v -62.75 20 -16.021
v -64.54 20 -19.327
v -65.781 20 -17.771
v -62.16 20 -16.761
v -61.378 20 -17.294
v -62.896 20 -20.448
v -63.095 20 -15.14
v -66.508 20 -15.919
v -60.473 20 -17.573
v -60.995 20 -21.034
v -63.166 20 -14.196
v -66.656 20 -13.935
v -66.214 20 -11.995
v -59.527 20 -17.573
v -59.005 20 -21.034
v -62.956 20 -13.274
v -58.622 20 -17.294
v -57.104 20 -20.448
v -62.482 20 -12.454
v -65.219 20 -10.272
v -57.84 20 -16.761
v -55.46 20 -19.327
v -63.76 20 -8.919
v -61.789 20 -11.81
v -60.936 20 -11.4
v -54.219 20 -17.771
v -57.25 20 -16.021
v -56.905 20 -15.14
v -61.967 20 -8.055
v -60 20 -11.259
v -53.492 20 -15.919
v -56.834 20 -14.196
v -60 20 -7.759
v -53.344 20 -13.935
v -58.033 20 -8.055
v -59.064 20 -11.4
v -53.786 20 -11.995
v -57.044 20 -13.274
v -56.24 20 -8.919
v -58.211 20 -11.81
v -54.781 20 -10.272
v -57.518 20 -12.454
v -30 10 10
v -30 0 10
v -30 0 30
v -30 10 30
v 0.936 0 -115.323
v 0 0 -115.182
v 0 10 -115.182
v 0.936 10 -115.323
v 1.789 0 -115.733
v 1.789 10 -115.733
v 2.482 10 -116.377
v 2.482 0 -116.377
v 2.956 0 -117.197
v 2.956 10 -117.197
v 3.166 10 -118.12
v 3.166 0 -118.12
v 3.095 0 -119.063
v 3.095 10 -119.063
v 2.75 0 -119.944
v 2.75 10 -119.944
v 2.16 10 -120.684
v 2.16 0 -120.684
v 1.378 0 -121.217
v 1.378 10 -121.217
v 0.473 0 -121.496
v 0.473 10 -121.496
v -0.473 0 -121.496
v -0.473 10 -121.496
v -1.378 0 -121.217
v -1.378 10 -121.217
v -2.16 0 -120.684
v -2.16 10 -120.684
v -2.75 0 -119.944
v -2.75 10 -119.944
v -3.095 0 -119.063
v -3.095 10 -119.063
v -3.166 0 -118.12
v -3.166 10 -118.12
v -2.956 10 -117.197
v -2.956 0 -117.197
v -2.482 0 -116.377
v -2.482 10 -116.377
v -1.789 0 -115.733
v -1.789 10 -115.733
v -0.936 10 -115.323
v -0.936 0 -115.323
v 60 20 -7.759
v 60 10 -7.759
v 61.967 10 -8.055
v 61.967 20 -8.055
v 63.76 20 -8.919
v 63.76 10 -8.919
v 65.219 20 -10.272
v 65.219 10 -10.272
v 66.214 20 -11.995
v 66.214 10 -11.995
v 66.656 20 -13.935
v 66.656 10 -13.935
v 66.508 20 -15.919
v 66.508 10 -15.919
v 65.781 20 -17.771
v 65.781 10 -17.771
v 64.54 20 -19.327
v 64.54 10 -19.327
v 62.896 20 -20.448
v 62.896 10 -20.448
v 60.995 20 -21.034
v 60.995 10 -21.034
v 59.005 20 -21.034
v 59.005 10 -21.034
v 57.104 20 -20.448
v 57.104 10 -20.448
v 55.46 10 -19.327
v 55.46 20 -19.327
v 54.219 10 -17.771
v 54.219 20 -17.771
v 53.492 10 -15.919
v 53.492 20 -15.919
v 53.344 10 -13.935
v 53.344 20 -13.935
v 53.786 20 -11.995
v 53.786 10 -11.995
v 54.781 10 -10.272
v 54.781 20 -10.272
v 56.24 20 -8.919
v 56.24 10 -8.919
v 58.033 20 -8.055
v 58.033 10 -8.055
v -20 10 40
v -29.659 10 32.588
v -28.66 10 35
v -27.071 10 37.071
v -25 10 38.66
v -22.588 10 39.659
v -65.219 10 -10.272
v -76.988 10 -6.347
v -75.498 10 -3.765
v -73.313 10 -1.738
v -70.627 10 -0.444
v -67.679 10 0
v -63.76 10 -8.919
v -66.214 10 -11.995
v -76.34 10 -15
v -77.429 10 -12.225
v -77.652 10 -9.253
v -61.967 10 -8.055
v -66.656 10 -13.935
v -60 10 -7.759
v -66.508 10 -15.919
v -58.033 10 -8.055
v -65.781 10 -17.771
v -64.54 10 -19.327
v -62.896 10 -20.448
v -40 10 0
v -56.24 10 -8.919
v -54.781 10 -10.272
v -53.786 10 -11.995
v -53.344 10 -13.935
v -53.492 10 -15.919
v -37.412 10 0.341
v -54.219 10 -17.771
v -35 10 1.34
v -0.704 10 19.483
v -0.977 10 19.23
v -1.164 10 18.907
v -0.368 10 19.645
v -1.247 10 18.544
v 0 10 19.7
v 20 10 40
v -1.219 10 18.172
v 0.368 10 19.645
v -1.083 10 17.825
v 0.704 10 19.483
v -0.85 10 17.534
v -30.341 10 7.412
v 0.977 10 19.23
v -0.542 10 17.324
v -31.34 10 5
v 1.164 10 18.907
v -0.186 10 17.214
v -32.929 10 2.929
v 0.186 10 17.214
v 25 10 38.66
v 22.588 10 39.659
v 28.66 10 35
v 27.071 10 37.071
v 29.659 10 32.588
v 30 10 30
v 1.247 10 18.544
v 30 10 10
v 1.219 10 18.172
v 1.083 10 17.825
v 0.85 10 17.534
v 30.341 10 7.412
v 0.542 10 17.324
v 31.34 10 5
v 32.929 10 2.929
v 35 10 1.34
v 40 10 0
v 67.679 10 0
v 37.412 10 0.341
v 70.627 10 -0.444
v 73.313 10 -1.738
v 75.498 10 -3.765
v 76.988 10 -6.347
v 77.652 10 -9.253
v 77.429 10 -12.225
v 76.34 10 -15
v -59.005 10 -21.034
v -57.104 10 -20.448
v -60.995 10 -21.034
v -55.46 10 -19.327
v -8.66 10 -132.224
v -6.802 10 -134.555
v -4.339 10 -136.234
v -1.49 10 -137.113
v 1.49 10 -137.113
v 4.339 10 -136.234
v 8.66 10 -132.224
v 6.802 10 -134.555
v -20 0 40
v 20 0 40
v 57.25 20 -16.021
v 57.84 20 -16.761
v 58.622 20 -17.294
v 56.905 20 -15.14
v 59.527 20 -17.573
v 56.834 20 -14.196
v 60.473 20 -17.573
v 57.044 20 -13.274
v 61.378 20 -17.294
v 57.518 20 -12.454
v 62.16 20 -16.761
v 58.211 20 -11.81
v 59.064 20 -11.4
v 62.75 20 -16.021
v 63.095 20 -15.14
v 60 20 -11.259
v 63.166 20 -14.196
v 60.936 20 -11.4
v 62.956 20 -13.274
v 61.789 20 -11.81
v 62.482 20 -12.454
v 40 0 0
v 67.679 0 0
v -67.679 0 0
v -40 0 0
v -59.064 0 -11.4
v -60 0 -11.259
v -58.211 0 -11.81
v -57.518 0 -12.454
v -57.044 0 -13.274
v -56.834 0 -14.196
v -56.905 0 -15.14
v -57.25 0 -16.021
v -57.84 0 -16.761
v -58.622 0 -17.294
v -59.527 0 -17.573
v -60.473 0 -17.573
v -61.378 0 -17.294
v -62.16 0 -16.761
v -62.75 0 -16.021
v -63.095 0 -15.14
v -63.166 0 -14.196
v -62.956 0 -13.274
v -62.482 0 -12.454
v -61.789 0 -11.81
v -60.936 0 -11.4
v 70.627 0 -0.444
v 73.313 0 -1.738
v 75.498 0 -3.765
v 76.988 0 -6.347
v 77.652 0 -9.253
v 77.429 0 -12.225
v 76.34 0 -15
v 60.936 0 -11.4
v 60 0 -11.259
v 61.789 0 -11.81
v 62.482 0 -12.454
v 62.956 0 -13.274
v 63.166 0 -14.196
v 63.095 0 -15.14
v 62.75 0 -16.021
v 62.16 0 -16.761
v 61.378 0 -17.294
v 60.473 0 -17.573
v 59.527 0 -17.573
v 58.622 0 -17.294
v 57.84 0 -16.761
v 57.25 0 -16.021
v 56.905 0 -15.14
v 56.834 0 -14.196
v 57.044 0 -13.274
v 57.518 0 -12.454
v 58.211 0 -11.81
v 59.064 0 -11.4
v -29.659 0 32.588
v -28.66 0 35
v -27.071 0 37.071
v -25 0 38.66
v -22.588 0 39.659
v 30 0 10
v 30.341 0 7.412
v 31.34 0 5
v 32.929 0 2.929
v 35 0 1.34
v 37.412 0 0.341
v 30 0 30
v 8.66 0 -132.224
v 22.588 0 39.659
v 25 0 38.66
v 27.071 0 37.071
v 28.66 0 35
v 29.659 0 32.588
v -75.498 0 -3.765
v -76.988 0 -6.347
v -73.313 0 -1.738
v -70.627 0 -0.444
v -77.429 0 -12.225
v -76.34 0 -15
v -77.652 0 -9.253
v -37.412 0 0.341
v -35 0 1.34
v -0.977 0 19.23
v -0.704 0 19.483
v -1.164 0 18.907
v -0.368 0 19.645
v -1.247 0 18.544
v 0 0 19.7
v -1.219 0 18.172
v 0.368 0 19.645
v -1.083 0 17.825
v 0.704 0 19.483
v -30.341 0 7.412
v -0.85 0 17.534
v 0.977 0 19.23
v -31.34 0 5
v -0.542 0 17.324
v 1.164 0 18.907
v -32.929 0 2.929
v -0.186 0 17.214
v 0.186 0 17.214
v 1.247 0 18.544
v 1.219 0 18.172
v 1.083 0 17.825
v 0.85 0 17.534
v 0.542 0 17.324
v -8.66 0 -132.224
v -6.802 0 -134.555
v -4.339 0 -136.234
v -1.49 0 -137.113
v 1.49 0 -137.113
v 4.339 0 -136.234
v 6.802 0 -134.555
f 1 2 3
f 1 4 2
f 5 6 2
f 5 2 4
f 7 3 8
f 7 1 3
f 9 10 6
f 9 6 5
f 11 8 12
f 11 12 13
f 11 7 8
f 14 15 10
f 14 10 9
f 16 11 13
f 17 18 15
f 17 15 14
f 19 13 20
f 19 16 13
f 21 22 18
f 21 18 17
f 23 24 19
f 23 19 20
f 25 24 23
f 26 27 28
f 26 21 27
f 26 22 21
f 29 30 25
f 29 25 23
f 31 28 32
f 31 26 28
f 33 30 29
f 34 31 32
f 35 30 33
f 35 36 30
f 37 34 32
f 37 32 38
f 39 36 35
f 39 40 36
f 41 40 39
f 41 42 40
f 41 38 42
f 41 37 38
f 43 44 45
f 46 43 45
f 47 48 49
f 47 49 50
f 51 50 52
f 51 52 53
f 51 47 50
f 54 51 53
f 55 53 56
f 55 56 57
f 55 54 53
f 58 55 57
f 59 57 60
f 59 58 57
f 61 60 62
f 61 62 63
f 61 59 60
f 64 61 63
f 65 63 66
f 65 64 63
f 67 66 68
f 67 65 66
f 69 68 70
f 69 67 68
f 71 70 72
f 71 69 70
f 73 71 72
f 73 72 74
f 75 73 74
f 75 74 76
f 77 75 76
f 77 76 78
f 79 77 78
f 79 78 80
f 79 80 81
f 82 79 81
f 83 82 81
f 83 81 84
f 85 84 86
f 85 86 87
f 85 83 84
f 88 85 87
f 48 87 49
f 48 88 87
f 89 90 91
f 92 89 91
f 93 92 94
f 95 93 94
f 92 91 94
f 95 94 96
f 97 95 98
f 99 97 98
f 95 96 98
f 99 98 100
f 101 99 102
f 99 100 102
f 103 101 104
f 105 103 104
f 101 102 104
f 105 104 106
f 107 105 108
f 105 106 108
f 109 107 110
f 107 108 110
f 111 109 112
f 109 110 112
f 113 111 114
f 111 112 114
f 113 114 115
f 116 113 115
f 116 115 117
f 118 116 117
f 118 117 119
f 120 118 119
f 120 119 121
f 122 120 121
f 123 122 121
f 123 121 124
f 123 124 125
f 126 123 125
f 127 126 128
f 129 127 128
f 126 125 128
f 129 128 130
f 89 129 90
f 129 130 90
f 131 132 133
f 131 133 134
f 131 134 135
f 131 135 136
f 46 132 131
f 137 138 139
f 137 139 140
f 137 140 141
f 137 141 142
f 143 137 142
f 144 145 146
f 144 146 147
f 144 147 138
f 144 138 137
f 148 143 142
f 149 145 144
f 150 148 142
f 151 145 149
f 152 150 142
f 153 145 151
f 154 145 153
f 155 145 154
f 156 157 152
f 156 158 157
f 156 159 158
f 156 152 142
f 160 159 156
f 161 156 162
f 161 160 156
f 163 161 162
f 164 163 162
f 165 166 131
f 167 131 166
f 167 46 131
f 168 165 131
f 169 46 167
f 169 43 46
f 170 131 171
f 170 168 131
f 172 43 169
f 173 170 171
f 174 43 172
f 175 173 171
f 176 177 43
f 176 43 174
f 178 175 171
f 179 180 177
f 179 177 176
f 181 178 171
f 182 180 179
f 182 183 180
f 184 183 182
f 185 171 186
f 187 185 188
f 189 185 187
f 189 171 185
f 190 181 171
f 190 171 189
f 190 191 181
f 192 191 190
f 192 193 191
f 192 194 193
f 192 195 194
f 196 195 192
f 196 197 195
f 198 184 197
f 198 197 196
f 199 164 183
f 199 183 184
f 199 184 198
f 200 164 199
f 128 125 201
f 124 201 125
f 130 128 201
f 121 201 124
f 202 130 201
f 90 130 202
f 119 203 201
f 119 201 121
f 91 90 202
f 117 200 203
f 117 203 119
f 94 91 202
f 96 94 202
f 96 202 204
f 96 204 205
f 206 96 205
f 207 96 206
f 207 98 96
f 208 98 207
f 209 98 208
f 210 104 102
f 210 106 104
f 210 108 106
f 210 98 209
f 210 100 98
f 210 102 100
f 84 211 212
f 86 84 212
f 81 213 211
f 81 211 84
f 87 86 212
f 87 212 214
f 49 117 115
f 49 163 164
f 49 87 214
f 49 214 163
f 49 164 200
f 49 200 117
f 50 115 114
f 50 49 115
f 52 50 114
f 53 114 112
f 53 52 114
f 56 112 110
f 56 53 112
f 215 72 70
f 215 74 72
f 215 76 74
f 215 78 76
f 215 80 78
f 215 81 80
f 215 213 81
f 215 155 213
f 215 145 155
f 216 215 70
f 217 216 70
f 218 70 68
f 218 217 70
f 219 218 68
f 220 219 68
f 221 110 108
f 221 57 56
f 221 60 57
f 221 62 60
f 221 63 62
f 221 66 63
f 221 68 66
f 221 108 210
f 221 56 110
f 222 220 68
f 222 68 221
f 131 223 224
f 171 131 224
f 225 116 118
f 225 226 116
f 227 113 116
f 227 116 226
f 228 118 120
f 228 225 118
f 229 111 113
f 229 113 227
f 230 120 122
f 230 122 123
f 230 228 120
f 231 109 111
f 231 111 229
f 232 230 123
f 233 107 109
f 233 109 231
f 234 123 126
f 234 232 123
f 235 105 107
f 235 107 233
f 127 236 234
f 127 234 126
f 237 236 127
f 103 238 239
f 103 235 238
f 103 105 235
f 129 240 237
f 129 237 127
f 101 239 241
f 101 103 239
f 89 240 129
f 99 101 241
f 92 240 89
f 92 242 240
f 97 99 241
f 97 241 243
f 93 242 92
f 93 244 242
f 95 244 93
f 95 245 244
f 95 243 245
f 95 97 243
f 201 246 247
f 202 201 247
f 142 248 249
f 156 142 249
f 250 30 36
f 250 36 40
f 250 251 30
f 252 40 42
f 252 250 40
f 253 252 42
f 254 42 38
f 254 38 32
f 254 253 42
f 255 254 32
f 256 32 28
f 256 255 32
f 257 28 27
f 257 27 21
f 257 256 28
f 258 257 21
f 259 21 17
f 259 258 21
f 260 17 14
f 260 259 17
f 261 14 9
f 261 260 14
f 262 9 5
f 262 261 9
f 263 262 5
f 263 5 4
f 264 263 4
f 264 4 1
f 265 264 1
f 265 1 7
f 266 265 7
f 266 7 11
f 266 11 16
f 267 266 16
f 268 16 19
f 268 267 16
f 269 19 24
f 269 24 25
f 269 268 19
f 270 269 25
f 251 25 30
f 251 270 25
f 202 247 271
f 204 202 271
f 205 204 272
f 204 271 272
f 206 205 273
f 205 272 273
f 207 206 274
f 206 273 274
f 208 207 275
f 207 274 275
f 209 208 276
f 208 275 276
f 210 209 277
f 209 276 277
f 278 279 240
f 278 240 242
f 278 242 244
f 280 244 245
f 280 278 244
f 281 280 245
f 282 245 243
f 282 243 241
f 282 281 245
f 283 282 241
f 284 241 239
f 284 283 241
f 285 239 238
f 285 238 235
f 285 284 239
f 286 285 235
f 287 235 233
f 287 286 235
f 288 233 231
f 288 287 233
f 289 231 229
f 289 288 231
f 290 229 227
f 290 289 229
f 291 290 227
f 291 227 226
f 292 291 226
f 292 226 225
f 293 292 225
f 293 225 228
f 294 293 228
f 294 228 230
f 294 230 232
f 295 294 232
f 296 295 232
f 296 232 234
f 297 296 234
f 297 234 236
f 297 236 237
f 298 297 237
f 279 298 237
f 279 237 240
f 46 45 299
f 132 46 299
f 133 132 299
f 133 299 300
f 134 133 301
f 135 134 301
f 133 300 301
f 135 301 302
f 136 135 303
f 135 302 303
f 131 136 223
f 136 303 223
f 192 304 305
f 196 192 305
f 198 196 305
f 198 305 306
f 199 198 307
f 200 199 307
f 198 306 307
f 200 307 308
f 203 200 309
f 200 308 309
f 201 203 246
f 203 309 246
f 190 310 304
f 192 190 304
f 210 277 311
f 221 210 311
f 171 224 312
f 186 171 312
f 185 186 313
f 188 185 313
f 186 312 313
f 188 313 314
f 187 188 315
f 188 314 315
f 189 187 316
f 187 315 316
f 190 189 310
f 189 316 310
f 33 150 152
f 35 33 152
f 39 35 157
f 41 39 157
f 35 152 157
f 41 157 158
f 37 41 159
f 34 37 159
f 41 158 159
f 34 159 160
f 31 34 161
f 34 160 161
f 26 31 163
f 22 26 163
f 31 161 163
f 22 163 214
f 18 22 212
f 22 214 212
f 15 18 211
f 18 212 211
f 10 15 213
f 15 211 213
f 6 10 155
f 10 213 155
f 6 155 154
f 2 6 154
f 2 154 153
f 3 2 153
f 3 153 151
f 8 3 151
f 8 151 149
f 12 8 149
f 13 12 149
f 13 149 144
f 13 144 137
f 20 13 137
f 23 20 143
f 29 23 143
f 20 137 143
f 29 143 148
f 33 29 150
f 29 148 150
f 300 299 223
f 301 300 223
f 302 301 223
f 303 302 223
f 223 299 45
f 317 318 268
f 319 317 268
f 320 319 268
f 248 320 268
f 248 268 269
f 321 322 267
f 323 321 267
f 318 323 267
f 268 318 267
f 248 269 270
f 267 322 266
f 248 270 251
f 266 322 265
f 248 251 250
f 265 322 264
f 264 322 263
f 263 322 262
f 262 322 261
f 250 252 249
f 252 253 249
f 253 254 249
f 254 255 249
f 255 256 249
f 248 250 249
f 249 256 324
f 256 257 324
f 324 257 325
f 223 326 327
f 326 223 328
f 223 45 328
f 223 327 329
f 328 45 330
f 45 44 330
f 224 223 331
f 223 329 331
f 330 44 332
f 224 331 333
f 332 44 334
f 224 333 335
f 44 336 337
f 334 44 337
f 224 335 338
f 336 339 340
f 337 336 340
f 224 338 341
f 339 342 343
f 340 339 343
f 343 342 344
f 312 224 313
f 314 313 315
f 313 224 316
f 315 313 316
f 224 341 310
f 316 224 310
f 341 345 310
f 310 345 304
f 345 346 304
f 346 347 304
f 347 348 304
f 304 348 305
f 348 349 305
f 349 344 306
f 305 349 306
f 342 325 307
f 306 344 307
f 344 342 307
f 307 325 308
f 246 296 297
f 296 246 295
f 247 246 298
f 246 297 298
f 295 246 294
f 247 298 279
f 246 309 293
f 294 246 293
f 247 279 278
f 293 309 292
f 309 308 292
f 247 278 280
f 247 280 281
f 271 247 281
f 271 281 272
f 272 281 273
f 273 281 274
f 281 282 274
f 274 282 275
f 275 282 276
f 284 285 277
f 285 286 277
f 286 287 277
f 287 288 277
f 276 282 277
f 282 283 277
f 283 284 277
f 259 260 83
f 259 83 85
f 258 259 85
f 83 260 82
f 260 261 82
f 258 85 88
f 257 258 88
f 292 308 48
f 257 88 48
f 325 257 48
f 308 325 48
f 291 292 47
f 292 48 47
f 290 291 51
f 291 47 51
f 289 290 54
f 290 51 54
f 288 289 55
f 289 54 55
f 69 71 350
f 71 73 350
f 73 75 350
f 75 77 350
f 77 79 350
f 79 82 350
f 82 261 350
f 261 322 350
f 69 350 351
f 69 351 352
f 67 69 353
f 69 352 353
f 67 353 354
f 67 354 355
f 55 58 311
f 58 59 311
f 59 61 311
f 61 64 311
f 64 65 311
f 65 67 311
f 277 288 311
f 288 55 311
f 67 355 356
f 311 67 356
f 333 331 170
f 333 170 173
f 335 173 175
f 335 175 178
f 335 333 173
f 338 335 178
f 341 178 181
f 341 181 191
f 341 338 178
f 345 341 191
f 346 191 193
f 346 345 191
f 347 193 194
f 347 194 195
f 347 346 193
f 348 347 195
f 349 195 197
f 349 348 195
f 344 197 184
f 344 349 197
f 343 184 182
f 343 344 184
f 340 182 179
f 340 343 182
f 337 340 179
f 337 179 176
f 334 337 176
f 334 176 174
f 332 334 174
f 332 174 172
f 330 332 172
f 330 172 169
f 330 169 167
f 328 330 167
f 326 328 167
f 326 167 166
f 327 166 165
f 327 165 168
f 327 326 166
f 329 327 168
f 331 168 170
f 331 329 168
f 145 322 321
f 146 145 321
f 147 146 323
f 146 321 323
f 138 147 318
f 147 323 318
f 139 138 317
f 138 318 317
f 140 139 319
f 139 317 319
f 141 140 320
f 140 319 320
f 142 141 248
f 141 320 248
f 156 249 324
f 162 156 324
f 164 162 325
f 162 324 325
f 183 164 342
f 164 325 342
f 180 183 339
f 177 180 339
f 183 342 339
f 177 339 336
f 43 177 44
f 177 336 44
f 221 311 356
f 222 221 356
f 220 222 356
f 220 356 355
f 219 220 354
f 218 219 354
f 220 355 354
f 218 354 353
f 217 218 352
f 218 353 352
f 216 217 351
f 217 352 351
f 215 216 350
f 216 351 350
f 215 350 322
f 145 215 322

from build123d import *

# Parameters (mm, degrees)
SKETCH1_R           = 3.175
SKETCH1_R_2         = 1.25
BOSS_EXTRUDE2_DEPTH = 10
SKETCH2_R           = 6.675
SKETCH2_R_2         = 3.175
BOSS_EXTRUDE3_DEPTH = 10


with BuildPart() as part:
    # Sketch1 → Boss-Extrude2 (new body)
    with BuildSketch(Plane(origin=(0, 0, 0), x_dir=(1, 0, 0), z_dir=(0, 1, 0))):
        with BuildLine():
            Line((-67.679491924, 0), (-40, 0))
            ThreePointArc((-40, 0), (-32.928932188, -2.928932188), (-30, -10))
            Line((-30, -10), (-30, -30))
            ThreePointArc((-30, -30), (-27.071067812, -37.071067812), (-20, -40))
            Line((-20, -40), (20, -40))
            ThreePointArc((20, -40), (27.071067812, -37.071067812), (30, -30))
            Line((30, -30), (30, -10))
            ThreePointArc((30, -10), (32.928932188, -2.928932188), (40, 0))
            Line((40, 0), (67.679491924, 0))
            ThreePointArc((67.679491924, 0), (76.339745962, 5), (76.339745962, 15))
            Line((76.339745962, 15), (8.660254038, 132.224318643))
            ThreePointArc((8.660254038, 132.224318643), (0, 137.224318643), (-8.660254038, 132.224318643))
            Line((-8.660254038, 132.224318643), (-76.339745962, 15))
            ThreePointArc((-76.339745962, 15), (-76.339745962, 5), (-67.679491924, 0))
        make_face()
        with Locations(Location((-60, 14.43375673, 0), (0, 0, 270))):
            Circle(SKETCH1_R, mode=Mode.SUBTRACT)
        with Locations(Location((0, 118.356805184, 0), (0, 0, 270))):
            Circle(SKETCH1_R, mode=Mode.SUBTRACT)
        with Locations(Location((60, 14.43375673, 0), (0, 0, 270))):
            Circle(SKETCH1_R, mode=Mode.SUBTRACT)
        with Locations(Location((0, -18.450194816, 0), (0, 0, 270))):
            Circle(SKETCH1_R_2, mode=Mode.SUBTRACT)
    extrude(amount=BOSS_EXTRUDE2_DEPTH)

    # Sketch2 → Boss-Extrude3 (add)
    # profile 1 of 2: a face of its own
    with BuildSketch(Plane(origin=(0, 10, 0), x_dir=(1, 0, 0), z_dir=(0, 1, 0))):
        with Locations(Location((-60, 14.43375673, 0), (0, 0, 270))):
            Circle(SKETCH2_R)
        with Locations(Location((-60, 14.43375673, 0), (0, 0, 270))):
            Circle(SKETCH2_R_2, mode=Mode.SUBTRACT)
    # profile 2 of 2: a face of its own
    with BuildSketch(Plane(origin=(0, 10, 0), x_dir=(1, 0, 0), z_dir=(0, 1, 0))):
        with Locations(Location((60, 14.43375673, 0), (0, 0, 270))):
            Circle(SKETCH2_R)
        with Locations(Location((60, 14.43375673, 0), (0, 0, 270))):
            Circle(SKETCH2_R_2, mode=Mode.SUBTRACT)
    extrude(amount=BOSS_EXTRUDE3_DEPTH)


solid = part.part
